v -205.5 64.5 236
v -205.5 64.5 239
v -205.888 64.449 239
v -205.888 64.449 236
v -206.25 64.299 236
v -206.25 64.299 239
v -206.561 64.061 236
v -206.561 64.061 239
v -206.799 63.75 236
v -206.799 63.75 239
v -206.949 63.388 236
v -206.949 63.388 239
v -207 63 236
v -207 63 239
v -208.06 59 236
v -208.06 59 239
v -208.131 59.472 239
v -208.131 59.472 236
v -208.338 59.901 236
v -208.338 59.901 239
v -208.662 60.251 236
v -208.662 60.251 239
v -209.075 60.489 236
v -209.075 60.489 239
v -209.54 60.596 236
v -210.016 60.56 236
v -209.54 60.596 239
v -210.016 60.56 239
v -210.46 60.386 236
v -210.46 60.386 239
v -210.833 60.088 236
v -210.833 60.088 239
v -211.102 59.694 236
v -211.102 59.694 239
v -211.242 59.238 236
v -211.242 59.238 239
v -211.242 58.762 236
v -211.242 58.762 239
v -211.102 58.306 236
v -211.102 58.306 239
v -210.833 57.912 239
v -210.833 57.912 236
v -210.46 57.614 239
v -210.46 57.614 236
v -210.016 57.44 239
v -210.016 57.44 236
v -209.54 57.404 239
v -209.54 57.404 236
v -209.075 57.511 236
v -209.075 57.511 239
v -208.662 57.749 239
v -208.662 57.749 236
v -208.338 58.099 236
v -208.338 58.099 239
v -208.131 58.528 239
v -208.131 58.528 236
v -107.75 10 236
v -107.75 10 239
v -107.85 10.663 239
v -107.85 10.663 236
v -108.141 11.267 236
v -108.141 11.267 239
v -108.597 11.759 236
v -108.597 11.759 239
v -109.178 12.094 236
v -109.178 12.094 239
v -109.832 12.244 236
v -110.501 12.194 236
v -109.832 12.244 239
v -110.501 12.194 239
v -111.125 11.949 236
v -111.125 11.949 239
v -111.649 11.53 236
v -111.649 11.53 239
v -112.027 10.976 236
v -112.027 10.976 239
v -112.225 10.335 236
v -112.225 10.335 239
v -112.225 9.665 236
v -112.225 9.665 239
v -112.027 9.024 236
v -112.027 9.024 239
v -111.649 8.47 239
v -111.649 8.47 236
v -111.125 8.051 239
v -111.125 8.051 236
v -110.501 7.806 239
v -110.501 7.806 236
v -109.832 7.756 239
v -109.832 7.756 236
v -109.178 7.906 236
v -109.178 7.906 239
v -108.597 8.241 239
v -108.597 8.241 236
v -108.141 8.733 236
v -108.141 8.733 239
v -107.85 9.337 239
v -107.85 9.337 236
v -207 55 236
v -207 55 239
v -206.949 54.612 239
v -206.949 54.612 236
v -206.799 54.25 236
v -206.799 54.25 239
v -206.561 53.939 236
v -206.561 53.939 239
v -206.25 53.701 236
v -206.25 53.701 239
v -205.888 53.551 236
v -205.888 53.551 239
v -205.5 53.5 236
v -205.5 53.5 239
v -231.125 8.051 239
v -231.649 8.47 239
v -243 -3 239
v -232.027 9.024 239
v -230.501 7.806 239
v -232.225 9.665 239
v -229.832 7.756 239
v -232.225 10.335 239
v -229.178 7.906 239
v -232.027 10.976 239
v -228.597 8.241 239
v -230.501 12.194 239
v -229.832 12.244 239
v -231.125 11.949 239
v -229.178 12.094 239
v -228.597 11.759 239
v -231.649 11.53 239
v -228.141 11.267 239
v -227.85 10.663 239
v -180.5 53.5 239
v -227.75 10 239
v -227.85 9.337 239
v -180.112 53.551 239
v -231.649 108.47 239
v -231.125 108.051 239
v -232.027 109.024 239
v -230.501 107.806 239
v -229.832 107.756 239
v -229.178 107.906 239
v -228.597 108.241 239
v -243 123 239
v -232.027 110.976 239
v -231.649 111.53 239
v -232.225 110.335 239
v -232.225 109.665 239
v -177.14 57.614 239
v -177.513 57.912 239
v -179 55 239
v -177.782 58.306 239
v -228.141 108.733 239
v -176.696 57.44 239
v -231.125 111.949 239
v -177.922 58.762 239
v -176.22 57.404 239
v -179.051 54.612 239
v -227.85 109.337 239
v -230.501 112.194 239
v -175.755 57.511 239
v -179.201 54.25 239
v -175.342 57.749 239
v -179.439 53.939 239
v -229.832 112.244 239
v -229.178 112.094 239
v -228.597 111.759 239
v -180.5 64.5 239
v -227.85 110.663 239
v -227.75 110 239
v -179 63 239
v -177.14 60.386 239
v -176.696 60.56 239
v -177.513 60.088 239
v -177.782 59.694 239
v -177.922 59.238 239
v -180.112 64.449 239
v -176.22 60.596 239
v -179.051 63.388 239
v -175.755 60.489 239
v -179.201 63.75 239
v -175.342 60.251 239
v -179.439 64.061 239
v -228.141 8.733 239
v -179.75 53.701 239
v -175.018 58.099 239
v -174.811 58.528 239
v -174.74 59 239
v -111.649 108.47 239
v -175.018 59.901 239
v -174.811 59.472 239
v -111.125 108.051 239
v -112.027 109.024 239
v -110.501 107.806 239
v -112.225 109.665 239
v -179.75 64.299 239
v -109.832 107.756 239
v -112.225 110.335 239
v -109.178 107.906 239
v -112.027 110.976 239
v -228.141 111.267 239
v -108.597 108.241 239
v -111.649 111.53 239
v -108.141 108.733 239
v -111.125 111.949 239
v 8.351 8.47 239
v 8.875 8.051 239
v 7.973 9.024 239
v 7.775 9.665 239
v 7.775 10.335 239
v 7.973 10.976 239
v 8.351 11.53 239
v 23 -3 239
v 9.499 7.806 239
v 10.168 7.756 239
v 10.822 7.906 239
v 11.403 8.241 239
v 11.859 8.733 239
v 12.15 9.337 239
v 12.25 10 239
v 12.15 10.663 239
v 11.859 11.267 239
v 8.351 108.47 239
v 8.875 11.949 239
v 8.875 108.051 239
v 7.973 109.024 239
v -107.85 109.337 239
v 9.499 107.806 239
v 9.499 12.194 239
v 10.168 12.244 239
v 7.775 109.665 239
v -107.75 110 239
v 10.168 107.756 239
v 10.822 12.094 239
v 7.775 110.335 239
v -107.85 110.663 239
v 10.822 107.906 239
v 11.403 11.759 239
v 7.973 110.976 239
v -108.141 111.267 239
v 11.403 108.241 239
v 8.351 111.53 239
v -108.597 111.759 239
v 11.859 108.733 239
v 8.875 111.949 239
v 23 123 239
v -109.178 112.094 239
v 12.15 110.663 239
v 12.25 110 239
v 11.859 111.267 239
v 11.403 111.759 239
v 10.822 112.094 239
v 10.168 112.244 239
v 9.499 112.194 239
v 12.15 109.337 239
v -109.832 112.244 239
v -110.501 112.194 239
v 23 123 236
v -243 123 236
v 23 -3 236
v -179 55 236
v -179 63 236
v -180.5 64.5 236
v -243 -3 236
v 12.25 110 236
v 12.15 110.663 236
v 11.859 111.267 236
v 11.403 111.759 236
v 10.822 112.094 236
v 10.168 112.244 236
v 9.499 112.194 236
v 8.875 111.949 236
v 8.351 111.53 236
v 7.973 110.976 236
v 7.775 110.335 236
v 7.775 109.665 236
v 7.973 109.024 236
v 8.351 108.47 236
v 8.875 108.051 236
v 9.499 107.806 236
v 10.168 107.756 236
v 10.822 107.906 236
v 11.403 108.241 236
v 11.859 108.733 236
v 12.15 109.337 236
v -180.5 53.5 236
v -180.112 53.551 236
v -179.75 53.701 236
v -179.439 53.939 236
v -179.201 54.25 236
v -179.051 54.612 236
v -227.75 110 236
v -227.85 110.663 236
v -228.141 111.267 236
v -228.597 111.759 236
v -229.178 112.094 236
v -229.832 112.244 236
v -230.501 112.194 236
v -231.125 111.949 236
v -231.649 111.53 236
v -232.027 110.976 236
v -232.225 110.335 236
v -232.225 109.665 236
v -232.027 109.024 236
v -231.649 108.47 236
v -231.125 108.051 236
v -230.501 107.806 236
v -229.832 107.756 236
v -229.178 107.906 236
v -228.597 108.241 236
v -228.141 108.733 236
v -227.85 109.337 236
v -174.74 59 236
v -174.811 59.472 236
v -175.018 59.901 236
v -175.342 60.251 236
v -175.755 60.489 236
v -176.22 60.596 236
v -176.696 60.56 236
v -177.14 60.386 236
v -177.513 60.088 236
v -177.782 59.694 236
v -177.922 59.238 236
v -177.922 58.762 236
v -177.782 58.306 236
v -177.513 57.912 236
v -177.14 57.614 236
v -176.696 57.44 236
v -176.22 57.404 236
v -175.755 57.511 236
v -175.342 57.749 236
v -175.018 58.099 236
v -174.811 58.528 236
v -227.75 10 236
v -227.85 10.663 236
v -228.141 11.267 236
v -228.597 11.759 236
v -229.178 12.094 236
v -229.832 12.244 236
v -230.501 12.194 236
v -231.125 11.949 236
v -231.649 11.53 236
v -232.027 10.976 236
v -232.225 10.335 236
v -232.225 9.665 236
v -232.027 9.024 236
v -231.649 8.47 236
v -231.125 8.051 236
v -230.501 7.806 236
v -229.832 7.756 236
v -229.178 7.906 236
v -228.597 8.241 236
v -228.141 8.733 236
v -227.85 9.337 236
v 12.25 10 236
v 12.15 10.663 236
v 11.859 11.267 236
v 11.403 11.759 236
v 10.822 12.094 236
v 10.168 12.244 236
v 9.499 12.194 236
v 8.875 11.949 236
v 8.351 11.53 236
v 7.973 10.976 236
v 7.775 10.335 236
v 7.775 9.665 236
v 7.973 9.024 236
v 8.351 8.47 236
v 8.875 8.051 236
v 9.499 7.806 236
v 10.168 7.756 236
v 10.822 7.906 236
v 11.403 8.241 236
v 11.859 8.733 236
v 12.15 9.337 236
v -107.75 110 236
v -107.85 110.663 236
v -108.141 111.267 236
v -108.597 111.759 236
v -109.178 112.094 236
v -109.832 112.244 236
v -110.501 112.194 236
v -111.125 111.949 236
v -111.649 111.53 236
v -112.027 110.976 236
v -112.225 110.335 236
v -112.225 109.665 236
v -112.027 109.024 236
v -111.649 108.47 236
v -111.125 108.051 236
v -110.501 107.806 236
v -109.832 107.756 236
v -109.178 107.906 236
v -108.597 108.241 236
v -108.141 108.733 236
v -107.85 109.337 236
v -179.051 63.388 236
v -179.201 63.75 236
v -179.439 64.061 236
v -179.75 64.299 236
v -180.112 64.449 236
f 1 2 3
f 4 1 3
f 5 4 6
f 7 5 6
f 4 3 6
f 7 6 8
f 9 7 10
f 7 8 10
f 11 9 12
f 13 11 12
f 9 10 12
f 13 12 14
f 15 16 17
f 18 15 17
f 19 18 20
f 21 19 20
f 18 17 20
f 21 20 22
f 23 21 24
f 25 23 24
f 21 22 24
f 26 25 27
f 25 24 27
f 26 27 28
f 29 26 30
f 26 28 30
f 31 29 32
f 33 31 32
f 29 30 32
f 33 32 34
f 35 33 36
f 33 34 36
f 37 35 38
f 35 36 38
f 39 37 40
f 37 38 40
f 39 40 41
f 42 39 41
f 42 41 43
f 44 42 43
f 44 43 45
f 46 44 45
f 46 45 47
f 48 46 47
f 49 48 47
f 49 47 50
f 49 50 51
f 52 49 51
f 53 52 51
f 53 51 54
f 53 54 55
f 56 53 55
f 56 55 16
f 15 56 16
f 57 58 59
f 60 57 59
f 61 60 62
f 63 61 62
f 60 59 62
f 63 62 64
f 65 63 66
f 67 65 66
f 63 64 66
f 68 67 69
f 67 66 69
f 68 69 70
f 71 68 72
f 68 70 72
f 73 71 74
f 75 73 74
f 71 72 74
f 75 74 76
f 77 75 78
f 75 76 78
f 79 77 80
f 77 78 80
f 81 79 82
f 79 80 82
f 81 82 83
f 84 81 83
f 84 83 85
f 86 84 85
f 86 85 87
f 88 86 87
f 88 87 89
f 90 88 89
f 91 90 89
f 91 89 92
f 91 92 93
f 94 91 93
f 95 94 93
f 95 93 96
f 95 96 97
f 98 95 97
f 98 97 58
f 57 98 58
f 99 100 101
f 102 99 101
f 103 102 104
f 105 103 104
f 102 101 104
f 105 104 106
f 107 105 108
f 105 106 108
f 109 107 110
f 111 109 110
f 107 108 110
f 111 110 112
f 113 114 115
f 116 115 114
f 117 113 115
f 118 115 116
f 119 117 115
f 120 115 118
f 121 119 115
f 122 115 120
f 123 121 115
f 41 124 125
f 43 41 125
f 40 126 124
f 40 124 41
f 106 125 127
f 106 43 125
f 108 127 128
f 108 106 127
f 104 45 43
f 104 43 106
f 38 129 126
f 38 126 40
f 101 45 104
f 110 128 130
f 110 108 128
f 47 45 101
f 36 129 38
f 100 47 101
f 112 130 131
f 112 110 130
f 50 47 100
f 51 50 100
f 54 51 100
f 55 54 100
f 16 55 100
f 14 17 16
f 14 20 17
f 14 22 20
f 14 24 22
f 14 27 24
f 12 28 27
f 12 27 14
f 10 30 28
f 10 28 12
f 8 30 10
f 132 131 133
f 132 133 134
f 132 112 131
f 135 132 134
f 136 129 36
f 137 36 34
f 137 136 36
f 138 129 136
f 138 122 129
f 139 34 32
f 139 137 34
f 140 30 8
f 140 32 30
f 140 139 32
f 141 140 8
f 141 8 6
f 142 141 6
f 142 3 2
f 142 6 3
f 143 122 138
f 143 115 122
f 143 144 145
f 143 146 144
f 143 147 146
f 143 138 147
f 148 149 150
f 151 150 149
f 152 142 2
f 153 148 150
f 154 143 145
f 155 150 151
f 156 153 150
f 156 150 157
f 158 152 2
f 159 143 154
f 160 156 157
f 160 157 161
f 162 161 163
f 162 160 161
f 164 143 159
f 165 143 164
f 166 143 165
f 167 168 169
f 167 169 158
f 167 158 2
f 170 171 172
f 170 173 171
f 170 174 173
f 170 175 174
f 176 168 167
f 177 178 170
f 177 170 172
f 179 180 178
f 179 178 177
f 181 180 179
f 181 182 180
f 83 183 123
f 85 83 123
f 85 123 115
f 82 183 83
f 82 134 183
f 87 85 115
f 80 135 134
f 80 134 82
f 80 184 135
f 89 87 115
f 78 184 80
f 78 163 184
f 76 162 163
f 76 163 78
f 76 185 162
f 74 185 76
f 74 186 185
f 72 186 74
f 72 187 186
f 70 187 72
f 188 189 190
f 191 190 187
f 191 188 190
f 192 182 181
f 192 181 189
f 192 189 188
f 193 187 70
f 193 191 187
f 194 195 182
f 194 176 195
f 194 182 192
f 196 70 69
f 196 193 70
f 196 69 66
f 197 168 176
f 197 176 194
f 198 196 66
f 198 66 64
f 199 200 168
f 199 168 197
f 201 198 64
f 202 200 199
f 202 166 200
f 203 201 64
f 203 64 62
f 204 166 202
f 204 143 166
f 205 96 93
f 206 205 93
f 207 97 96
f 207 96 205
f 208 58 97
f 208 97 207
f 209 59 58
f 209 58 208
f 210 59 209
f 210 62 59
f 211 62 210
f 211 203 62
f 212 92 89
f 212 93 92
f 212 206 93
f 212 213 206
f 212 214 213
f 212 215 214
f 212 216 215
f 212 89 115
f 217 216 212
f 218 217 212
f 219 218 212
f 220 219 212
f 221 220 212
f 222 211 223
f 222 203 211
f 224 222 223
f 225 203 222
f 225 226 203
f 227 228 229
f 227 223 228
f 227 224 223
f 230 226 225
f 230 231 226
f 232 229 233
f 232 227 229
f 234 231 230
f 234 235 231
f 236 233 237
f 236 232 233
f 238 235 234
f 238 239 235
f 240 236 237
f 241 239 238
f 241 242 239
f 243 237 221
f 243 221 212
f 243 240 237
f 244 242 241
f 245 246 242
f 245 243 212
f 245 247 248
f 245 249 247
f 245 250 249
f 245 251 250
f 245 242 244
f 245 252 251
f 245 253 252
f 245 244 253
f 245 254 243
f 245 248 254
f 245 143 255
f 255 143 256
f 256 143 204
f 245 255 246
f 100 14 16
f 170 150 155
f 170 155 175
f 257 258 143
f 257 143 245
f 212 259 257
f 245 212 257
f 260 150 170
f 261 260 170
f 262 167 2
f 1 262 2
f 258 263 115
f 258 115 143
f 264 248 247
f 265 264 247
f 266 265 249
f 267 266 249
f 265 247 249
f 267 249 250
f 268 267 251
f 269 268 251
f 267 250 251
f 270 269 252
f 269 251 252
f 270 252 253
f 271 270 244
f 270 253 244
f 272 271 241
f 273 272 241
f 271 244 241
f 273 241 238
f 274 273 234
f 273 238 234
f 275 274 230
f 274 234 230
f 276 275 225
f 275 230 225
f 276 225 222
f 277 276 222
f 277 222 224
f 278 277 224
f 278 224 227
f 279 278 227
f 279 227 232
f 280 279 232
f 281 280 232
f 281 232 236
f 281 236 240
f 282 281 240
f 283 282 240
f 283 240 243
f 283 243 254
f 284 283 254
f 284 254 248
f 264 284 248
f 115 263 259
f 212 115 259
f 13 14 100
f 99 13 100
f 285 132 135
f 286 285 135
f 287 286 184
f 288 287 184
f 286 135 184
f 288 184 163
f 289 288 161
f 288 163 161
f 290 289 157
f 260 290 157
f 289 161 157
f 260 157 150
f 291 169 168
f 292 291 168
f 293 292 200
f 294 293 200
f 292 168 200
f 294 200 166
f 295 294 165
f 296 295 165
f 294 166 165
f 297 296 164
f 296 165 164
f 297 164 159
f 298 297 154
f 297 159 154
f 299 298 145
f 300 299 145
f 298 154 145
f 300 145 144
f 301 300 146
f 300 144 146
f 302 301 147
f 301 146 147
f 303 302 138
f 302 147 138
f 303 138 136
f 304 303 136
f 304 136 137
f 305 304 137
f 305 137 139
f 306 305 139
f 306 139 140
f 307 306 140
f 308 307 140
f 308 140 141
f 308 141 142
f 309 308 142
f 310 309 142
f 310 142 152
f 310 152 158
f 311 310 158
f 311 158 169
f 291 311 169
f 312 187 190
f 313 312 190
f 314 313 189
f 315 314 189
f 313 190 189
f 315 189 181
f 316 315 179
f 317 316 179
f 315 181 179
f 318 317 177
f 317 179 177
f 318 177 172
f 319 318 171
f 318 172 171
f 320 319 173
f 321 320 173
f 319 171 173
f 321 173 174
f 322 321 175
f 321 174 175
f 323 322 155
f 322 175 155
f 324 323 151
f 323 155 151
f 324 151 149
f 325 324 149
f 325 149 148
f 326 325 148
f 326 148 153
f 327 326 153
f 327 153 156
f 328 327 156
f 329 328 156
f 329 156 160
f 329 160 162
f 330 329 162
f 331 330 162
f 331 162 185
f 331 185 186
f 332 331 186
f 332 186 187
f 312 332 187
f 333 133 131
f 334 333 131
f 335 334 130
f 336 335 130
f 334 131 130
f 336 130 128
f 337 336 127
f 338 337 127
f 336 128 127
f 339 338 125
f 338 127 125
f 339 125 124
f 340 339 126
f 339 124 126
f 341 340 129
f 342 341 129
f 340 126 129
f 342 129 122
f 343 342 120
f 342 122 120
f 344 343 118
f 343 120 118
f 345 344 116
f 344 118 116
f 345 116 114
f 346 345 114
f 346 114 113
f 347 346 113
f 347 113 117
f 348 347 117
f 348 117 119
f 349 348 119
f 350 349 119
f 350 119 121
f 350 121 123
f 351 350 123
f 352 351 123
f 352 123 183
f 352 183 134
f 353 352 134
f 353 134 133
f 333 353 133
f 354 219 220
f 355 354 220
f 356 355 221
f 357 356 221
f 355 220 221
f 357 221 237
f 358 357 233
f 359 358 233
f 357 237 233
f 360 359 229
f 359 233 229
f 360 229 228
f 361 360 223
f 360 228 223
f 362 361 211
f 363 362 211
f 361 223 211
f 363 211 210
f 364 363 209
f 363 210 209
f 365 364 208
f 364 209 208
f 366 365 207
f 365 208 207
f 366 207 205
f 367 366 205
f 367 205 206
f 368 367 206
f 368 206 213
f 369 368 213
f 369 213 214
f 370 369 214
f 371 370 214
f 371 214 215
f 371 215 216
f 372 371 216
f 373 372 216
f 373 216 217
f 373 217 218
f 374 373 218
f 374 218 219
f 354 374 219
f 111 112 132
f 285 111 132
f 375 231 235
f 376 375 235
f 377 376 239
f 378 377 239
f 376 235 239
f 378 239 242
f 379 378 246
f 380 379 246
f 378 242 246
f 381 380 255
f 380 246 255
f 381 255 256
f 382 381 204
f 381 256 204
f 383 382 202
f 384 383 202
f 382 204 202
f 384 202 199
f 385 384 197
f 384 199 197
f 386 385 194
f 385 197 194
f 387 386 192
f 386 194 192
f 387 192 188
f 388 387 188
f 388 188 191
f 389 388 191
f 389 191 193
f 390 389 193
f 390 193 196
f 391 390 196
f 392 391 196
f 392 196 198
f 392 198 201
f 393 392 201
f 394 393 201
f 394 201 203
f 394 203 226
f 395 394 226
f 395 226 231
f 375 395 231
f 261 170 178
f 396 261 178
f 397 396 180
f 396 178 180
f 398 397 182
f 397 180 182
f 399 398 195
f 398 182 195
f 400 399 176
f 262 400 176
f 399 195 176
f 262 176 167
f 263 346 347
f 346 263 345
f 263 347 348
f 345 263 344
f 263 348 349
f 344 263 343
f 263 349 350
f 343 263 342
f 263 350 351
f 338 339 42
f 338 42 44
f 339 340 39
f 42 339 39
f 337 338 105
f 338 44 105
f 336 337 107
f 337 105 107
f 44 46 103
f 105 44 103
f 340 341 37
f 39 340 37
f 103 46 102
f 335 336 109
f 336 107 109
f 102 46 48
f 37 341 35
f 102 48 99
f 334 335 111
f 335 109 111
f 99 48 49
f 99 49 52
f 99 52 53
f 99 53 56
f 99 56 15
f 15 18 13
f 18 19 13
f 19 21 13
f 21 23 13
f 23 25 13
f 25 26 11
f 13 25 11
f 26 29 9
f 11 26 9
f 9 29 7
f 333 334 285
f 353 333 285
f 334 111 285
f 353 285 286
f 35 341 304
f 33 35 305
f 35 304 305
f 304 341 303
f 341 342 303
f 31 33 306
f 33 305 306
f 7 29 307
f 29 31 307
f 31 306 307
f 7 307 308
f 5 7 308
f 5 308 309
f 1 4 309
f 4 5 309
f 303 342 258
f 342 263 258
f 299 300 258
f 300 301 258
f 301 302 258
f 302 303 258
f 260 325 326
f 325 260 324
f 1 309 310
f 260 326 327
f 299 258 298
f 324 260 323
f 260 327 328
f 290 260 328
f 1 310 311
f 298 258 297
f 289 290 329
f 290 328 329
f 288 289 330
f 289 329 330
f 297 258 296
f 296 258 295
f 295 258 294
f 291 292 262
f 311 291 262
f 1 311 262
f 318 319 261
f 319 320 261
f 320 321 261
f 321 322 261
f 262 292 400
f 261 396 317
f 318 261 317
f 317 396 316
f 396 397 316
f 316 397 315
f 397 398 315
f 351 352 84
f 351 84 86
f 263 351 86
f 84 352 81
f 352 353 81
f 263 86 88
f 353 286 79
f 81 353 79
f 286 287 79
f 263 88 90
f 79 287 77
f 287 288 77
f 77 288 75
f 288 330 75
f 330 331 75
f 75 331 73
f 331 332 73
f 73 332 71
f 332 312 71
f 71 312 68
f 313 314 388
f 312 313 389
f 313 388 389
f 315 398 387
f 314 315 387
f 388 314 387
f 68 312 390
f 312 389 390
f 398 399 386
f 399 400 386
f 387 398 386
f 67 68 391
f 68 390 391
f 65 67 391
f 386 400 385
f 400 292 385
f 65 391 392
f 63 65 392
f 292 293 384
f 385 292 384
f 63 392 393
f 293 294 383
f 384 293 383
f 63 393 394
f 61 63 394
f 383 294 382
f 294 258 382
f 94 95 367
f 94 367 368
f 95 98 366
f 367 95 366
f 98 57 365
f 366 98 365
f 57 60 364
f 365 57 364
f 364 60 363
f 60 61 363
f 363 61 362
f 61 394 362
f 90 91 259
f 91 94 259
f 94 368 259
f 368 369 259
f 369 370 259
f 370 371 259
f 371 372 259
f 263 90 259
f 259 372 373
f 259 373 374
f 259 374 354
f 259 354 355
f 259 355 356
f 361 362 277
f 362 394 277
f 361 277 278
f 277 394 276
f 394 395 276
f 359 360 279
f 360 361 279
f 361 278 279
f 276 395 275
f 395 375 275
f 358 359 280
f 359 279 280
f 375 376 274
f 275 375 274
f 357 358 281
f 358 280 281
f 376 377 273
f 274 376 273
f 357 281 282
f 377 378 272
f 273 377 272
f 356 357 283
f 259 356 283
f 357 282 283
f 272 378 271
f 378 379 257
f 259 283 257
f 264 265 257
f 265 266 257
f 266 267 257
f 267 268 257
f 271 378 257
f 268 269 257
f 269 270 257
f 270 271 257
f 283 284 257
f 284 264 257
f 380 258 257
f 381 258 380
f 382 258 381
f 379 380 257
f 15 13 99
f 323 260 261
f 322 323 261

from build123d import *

# Parameters (mm, degrees)
SKETCH_1_W          = 266
SKETCH_1_H          = 126
EXTRUDE_1_DEPTH     = 3
SKETCH_2_R          = 2.25
CUT_EXTRUDE_1_DEPTH = 4
SKETCH1_R           = 1.6
CUT_EXTRUDE1_DEPTH  = 4


with BuildPart() as part:
    # Эскиз1 → Бобышка-Вытянуть1 (new body)
    with BuildSketch(Plane.XY.offset(236)):
        with Locations((-110, 60)):
            Rectangle(SKETCH_1_W, SKETCH_1_H)
    extrude(amount=EXTRUDE_1_DEPTH)

    # Эскиз2 → Вырез-Вытянуть1 (cut, through all)
    with BuildSketch(Plane.XY.offset(239)):
        with Locations((-230, 110)):
            Circle(SKETCH_2_R)
        with Locations((-110, 110)):
            Circle(SKETCH_2_R)
        with Locations((10, 110)):
            Circle(SKETCH_2_R)
        with Locations((10, 10)):
            Circle(SKETCH_2_R)
        with Locations((-110, 10)):
            Circle(SKETCH_2_R)
        with Locations((-230, 10)):
            Circle(SKETCH_2_R)
    extrude(amount=-CUT_EXTRUDE_1_DEPTH, mode=Mode.SUBTRACT)

    # Sketch1 → Cut-Extrude1 (cut, through all)
    with BuildSketch(Plane.XY.offset(239)):
        with Locations((-209.66, 59)):
            Circle(SKETCH1_R)
        with Locations((-176.34, 59)):
            Circle(SKETCH1_R)
        with BuildLine():
            Line((-207, 63), (-207, 55))
            ThreePointArc((-207, 55), (-206.560660172, 53.939339828), (-205.5, 53.5))
            Line((-205.5, 53.5), (-180.5, 53.5))
            ThreePointArc((-180.5, 53.5), (-179.439339828, 53.939339828), (-179, 55))
            Line((-179, 55), (-179, 63))
            ThreePointArc((-179, 63), (-179.439339828, 64.060660172), (-180.5, 64.5))
            Line((-180.5, 64.5), (-205.5, 64.5))
            ThreePointArc((-205.5, 64.5), (-206.560660172, 64.060660172), (-207, 63))
        make_face()
    extrude(amount=-CUT_EXTRUDE1_DEPTH, mode=Mode.SUBTRACT)


solid = part.part
